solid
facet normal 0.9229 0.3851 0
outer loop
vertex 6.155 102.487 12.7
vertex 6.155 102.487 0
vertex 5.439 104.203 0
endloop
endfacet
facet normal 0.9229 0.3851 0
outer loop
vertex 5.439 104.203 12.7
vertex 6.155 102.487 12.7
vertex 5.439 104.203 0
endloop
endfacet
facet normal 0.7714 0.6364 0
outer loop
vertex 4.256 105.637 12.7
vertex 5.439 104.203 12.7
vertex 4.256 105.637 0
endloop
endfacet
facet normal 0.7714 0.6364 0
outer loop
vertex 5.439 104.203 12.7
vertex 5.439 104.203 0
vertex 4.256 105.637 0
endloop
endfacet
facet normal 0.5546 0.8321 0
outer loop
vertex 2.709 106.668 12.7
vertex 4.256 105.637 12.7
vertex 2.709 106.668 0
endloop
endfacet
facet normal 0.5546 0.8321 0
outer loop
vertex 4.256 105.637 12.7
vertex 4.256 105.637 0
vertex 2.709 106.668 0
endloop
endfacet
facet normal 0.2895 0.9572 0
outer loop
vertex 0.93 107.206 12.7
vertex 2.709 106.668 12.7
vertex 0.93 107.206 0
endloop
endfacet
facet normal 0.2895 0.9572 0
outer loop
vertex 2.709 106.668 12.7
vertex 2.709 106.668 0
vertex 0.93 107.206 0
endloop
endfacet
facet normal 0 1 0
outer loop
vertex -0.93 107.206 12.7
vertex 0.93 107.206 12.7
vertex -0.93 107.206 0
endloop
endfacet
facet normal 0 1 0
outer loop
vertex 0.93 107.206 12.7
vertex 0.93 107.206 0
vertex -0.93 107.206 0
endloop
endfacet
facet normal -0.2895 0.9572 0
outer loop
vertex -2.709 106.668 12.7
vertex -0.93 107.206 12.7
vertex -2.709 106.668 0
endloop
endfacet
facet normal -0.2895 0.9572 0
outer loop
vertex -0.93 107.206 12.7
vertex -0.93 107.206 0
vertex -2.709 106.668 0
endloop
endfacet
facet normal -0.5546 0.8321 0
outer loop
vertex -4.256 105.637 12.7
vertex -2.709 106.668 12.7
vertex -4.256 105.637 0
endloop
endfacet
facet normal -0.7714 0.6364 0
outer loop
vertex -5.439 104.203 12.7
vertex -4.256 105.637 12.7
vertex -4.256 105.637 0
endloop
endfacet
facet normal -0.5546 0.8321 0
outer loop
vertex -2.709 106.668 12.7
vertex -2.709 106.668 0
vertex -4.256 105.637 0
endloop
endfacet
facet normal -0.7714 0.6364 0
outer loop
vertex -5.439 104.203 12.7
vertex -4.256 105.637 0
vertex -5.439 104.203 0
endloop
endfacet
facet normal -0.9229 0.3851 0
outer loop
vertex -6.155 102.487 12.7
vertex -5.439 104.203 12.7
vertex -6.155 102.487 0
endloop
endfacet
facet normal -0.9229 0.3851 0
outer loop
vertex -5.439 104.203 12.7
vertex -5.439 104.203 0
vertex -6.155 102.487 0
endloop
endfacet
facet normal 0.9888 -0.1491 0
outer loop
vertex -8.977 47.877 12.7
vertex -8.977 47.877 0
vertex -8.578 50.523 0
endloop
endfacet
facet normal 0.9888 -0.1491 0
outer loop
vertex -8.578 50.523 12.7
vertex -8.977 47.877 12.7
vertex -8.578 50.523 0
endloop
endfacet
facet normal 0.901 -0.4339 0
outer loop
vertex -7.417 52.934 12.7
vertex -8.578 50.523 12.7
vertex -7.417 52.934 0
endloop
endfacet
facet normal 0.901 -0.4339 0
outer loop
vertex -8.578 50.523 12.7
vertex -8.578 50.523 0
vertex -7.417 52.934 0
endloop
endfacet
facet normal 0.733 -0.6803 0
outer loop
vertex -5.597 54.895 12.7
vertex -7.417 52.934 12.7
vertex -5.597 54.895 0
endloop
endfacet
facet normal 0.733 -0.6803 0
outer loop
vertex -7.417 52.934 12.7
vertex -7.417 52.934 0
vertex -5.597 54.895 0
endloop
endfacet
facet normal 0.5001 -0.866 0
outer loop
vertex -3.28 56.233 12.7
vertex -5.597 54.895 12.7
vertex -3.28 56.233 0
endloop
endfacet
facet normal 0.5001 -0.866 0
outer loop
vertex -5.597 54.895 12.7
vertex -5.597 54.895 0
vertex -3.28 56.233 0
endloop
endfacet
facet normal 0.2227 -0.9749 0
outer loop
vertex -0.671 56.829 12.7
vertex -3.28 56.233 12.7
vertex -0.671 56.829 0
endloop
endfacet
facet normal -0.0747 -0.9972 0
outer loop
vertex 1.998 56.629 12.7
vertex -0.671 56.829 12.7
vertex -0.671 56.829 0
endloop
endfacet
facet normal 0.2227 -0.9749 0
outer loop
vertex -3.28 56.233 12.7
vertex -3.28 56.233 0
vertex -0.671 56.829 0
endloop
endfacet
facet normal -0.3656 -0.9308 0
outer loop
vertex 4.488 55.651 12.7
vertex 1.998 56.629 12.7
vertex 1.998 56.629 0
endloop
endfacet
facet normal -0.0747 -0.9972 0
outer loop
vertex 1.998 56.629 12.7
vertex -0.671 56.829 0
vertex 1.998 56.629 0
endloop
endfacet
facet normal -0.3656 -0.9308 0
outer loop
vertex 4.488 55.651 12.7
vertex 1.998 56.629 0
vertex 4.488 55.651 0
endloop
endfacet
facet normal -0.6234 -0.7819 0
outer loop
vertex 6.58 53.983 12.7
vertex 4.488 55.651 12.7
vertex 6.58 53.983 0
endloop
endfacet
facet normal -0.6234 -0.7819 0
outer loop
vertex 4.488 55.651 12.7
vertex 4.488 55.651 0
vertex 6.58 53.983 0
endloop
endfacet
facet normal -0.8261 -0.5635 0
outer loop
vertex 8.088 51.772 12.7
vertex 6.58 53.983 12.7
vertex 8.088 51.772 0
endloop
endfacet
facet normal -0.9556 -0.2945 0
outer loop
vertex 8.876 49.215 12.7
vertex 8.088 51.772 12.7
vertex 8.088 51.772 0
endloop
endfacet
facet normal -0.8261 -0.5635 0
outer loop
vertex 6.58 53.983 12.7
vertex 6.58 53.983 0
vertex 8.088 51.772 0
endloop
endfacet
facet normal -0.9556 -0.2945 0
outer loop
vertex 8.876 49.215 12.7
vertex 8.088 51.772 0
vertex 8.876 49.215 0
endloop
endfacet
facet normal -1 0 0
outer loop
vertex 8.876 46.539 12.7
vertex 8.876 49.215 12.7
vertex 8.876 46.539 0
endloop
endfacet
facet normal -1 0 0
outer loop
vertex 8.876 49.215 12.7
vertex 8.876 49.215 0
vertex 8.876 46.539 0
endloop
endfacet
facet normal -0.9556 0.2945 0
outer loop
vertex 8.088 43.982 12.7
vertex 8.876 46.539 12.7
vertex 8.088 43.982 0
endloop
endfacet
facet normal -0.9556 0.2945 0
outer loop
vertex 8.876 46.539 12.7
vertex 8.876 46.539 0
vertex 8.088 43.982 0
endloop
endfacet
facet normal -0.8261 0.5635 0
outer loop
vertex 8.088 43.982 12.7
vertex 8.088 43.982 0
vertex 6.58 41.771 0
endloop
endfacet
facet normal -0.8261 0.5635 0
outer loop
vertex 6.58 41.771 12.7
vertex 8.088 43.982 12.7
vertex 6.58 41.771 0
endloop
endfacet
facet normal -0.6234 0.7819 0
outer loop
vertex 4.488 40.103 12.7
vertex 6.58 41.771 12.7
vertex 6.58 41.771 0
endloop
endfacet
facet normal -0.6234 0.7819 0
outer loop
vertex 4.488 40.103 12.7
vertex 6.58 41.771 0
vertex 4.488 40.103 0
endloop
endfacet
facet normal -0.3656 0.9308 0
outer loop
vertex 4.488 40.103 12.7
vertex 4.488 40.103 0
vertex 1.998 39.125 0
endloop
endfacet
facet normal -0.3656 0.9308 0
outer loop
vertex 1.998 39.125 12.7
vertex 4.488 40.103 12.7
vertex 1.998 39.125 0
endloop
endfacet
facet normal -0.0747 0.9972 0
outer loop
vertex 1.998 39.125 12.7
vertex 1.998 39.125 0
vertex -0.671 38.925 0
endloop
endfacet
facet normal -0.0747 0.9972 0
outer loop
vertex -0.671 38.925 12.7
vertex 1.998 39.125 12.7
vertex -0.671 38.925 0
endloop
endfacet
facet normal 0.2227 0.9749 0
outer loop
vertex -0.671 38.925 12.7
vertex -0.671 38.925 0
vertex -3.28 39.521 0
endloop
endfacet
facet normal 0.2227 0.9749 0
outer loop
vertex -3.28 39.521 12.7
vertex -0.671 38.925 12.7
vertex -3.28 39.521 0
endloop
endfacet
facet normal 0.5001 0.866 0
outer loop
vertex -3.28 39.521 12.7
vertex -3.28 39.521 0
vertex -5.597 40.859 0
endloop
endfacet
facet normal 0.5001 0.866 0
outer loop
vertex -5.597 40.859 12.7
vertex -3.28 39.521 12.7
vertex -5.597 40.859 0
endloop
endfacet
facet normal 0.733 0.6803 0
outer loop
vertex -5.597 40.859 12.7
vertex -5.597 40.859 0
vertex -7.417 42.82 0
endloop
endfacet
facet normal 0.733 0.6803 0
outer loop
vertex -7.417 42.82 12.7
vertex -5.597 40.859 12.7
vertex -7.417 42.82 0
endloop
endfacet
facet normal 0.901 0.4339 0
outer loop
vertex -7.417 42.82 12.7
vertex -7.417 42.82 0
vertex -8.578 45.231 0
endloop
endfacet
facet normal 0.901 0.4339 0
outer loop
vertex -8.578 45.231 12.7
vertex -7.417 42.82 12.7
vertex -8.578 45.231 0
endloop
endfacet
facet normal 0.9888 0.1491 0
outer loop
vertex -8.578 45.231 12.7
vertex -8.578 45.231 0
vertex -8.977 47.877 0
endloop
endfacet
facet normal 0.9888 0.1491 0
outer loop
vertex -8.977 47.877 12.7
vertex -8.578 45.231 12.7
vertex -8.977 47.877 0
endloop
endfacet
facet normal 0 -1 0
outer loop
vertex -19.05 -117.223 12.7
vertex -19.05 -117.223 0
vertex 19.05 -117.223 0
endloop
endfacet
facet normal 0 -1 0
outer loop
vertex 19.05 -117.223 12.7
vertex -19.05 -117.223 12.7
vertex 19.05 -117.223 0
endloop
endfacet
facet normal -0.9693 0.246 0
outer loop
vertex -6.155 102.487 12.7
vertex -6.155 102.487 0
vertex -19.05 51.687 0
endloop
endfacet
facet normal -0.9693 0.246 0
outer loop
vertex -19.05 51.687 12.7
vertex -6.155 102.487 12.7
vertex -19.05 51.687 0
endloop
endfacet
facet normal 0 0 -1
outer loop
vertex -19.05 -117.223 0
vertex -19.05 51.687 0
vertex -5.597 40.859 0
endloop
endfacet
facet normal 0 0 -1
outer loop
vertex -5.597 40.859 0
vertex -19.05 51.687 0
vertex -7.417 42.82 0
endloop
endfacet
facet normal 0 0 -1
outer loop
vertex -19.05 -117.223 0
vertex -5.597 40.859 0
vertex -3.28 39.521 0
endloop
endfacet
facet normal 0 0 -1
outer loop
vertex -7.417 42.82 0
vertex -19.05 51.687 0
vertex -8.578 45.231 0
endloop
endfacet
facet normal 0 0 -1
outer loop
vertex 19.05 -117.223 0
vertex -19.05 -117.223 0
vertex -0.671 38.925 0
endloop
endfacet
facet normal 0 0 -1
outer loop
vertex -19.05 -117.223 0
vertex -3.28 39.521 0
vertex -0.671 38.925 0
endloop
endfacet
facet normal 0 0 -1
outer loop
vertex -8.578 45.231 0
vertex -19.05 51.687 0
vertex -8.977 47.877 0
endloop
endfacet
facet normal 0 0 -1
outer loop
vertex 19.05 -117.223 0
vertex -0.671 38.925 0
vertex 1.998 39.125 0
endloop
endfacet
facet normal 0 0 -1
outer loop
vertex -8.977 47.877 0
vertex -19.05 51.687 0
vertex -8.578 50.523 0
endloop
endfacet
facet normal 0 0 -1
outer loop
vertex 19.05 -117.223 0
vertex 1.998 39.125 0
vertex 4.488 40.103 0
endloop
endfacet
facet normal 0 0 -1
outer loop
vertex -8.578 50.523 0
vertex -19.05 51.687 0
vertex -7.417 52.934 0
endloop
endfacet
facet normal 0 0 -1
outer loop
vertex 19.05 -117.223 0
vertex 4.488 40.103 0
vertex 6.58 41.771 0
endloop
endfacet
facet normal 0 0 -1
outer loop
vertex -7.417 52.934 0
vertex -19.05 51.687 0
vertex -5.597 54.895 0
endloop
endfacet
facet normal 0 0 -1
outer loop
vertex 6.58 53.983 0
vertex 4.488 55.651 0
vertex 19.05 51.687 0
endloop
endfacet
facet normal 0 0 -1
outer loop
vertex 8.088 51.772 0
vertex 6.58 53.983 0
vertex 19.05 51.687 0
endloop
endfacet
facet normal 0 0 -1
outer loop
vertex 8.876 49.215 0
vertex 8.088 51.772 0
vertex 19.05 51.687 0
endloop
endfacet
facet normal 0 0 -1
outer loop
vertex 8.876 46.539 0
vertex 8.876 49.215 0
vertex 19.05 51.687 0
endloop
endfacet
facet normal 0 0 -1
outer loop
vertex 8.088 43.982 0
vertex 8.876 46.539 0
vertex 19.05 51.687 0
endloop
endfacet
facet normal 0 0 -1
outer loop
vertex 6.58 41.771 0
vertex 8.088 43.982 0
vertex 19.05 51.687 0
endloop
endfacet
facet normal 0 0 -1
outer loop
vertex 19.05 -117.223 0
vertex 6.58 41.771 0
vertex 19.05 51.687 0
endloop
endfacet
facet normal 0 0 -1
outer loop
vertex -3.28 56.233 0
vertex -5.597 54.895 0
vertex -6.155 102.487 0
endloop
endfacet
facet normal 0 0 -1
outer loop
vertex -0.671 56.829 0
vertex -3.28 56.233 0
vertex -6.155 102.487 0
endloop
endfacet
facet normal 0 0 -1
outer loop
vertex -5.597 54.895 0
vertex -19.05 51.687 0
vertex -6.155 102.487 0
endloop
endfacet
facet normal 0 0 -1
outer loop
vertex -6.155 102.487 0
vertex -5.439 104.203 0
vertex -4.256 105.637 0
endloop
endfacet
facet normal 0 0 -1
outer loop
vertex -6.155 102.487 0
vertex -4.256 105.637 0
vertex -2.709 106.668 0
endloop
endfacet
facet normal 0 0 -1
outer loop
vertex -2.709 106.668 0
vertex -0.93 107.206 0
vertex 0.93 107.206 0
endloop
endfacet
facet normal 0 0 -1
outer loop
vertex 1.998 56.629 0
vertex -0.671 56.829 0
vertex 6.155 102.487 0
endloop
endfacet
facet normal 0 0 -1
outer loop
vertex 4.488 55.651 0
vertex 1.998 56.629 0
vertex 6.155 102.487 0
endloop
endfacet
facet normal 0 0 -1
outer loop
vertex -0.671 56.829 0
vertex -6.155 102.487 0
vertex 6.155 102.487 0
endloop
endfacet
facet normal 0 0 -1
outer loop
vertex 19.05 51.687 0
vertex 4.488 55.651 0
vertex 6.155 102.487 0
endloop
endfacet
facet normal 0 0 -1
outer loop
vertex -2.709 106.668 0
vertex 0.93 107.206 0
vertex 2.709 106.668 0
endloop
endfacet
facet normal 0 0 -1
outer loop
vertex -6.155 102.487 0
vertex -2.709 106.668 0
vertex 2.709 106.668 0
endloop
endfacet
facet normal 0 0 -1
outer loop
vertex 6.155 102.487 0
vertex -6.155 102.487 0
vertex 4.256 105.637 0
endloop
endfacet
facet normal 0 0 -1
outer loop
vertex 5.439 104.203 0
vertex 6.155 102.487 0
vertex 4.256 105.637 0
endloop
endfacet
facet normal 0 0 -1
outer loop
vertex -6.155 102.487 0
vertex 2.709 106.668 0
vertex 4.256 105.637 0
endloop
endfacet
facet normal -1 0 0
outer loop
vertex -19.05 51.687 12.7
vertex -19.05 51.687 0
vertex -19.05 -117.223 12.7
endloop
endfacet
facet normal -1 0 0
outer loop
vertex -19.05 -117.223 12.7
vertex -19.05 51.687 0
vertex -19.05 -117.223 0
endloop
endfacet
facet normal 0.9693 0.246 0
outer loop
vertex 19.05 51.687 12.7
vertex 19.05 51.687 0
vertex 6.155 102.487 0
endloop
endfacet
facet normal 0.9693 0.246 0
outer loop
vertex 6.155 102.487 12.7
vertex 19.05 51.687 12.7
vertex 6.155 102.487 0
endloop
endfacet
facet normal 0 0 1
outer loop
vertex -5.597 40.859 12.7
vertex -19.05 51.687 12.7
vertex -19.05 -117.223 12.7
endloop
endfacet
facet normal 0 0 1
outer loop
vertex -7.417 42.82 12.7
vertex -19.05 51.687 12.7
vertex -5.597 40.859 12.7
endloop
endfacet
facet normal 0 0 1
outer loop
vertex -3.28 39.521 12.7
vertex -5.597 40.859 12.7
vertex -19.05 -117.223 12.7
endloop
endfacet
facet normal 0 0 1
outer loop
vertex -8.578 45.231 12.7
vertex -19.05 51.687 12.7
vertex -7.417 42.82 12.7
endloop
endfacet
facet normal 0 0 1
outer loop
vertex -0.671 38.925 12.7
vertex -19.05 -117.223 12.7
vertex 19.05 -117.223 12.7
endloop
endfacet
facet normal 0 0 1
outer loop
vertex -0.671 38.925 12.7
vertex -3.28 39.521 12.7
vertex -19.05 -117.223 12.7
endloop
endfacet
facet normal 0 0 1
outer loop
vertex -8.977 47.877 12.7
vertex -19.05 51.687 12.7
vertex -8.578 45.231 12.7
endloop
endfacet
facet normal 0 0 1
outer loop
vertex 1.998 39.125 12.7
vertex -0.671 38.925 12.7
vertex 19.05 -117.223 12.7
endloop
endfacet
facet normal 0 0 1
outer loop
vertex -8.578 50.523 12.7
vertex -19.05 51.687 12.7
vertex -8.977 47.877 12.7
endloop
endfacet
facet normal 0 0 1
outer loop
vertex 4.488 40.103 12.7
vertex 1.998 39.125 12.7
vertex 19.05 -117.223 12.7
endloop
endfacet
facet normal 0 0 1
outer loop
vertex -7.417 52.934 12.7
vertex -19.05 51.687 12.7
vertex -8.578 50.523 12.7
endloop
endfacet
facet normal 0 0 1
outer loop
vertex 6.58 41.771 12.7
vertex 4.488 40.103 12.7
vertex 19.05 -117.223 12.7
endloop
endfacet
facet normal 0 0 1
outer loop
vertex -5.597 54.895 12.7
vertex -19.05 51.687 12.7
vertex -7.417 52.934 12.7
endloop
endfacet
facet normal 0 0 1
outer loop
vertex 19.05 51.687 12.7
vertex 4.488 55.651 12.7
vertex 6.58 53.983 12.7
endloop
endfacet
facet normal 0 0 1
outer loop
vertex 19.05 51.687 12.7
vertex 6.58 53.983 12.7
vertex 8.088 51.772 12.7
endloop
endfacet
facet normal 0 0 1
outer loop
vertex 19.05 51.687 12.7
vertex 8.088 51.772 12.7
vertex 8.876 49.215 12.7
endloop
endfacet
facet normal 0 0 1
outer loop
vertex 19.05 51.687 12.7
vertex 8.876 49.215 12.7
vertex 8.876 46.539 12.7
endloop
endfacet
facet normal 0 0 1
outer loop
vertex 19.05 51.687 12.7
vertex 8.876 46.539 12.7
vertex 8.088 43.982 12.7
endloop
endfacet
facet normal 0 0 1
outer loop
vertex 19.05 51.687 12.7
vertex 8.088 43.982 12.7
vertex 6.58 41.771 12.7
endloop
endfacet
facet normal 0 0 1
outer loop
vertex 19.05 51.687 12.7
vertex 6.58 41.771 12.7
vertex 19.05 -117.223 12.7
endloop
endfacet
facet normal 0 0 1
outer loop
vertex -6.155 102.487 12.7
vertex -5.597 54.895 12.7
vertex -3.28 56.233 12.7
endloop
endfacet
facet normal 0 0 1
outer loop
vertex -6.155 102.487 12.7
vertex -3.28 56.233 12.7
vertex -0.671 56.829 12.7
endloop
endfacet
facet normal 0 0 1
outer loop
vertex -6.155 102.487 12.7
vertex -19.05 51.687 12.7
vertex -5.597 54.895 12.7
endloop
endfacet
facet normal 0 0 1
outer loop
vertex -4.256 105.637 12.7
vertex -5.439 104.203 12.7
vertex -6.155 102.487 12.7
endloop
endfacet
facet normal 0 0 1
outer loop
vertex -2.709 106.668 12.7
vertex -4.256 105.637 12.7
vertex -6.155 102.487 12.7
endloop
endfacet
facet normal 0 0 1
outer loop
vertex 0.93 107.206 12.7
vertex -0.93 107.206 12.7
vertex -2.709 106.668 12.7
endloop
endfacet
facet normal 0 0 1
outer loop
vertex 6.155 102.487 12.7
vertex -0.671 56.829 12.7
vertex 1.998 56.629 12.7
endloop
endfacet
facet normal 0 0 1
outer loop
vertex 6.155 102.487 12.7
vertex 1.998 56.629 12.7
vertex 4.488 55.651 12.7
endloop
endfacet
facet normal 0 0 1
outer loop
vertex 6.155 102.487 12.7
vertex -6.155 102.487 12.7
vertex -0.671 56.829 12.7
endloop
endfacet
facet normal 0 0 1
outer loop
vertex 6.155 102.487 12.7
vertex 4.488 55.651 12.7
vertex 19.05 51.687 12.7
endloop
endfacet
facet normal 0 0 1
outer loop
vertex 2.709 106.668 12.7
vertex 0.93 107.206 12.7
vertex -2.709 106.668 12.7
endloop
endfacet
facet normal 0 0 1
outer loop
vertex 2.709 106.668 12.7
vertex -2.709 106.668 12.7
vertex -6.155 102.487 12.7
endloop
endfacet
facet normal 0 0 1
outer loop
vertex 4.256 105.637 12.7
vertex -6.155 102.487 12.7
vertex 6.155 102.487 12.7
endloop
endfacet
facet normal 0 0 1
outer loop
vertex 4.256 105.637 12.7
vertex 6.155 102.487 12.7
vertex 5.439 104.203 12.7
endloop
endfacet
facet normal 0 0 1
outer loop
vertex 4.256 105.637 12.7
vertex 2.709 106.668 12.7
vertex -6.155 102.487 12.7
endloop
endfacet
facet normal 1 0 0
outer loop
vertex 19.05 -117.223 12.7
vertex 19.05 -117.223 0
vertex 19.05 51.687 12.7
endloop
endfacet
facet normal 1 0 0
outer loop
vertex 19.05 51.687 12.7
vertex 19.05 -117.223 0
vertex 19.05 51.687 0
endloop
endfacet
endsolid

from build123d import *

# Parameters (mm, degrees)
BOSS_EXTRUDE1_DEPTH = 12.7
SKETCH4_R           = 8.976739885
CUT_EXTRUDE1_DEPTH  = 120.43793735


with BuildPart() as part:
    # Sketch1 → Boss-Extrude1 (new body)
    with BuildSketch(Plane.XY):
        with BuildLine():
            Line((19.05, 51.687014291), (6.15479997, 102.487014291))
            ThreePointArc((6.15479997, 102.487014291), (0, 107.274664355), (-6.15479997, 102.487014291))
            Line((-6.15479997, 102.487014291), (-19.05, 51.687014291))
            Line((-19.05, 51.687014291), (-19.05, -117.222985709))
            Line((-19.05, -117.222985709), (19.05, -117.222985709))
            Line((19.05, -117.222985709), (19.05, 51.687014291))
        make_face()
    extrude(amount=BOSS_EXTRUDE1_DEPTH)

    # Sketch4 → Cut-Extrude1 (cut, through all)
    with BuildSketch(Plane(origin=(0, 0, 0), x_dir=(-1, 0, 0), z_dir=(0, 0, -1))):
        with Locations((0, 47.877014291)):
            Circle(SKETCH4_R)
    extrude(amount=-CUT_EXTRUDE1_DEPTH, mode=Mode.SUBTRACT)


solid = part.part
